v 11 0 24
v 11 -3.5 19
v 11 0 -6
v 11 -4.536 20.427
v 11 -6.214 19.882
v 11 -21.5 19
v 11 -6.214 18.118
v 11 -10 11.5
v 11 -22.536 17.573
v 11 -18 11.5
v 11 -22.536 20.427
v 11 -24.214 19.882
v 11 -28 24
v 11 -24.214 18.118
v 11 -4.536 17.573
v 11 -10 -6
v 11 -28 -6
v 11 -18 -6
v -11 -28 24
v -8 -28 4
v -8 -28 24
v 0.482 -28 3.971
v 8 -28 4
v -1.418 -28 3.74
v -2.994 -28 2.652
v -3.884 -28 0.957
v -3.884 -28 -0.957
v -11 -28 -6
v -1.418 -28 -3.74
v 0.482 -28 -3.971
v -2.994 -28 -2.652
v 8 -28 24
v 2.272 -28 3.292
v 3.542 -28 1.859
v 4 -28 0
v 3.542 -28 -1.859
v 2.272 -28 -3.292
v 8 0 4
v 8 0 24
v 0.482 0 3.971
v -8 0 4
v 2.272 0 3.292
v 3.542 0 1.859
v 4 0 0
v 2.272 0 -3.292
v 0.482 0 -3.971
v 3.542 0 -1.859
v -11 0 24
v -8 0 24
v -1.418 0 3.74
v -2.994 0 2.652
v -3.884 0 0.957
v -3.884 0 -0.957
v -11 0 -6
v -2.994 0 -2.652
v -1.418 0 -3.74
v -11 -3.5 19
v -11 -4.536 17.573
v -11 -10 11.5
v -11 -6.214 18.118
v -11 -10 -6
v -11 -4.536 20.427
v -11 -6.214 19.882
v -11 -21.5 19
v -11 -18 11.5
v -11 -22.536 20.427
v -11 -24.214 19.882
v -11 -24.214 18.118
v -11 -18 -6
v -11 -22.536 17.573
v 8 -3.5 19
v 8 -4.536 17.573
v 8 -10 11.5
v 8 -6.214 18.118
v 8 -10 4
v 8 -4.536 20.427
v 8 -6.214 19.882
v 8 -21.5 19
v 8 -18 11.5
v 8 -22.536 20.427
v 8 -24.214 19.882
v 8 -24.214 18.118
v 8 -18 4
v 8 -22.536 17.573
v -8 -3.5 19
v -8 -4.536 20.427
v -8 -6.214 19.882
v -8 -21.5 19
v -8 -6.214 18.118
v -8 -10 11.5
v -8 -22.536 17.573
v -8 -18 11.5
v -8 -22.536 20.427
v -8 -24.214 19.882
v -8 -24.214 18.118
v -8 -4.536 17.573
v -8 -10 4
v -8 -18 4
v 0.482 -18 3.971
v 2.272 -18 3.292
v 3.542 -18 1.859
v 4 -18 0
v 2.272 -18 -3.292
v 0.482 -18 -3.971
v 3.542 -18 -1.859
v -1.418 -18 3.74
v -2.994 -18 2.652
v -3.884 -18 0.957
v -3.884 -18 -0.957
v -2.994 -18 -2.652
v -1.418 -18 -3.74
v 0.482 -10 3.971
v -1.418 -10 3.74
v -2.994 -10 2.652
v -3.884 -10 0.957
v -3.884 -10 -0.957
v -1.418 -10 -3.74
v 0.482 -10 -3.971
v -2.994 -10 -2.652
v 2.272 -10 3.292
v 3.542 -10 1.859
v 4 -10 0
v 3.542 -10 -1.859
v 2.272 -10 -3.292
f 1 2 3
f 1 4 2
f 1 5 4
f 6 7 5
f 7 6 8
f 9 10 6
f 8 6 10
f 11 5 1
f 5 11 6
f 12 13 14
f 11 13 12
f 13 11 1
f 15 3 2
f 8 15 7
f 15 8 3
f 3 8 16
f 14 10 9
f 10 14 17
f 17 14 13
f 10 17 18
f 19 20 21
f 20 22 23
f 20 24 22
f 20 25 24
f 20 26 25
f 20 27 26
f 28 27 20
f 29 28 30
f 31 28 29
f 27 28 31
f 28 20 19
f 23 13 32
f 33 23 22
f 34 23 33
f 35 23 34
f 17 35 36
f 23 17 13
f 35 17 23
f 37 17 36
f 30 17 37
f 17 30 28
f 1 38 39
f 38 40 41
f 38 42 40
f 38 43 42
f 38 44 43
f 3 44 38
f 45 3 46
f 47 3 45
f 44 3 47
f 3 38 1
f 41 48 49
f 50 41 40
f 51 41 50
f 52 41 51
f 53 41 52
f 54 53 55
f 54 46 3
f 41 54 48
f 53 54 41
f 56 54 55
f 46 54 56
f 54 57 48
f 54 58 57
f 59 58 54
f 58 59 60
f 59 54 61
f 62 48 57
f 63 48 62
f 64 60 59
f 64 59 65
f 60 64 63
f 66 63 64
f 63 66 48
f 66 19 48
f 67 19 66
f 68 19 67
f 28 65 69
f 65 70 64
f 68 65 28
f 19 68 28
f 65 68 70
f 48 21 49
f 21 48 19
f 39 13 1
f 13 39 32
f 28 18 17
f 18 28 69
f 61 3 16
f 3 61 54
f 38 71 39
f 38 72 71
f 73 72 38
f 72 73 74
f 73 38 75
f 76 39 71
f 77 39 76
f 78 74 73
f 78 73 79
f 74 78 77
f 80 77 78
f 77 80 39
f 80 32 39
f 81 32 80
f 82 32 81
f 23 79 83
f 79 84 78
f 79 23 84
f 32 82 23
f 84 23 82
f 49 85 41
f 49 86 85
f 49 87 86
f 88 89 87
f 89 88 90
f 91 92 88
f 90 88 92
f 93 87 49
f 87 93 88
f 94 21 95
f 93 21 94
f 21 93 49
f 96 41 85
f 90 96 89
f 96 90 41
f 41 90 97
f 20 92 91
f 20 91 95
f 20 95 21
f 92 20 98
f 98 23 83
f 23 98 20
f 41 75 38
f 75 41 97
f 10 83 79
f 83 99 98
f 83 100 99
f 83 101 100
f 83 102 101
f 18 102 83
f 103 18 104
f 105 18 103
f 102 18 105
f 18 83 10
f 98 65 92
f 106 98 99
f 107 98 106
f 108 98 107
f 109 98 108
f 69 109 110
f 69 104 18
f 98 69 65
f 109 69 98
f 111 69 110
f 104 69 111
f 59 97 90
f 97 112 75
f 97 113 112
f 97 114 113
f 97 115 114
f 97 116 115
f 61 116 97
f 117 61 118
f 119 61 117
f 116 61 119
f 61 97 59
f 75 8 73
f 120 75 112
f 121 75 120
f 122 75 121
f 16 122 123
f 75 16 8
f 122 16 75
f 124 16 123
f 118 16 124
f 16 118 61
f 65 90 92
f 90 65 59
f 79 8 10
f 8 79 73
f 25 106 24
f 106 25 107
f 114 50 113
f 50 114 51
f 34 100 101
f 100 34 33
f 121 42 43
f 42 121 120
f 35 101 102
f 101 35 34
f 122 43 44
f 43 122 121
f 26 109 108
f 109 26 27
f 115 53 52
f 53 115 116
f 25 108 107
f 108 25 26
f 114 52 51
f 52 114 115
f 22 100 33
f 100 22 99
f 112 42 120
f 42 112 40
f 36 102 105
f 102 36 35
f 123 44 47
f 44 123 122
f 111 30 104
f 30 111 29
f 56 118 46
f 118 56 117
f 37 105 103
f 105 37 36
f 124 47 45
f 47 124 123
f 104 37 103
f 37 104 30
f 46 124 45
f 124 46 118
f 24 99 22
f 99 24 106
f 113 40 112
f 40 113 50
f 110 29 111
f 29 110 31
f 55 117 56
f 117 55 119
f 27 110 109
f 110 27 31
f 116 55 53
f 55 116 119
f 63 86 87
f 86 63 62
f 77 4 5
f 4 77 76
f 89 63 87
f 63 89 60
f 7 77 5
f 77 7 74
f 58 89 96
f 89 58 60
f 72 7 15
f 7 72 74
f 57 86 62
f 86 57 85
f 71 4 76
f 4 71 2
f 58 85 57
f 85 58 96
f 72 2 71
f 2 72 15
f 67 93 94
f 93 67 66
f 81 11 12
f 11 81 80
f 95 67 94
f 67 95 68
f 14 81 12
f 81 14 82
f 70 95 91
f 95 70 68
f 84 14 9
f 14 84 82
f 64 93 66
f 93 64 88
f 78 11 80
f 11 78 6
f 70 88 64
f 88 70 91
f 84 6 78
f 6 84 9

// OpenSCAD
// thickness of wood plate, mm
thick = 16;

// vertical length of plate side to cover, mm
sides = 20;

// inner diameter of bearing axle, mm
b_inner = 8;

// outer diameter of bearing, mm
b_outer = 22;

// height/thickness of bearing, mm
b_height = 7;


rotate( [ 90, 0, 0 ] ) {

translate( [0,0,10.5]) {
//	cylinder( d=b_outer, b_height ); // bearing
}

difference() {
union() {
translate( [ - 3 - 0.5 * thick , b_inner / 2, 0 ] )  {
	cube( [ thick + 3+3, sides, 21 + b_height ] ); // main body
	translate( [ 0, -2 -1 * b_inner, 0 ] )
		cube( [ thick + 3+ 3, sides, 21 + b_height ] ); // front round
	}
	}
translate( [ - 0.5 * thick, 0.5 * b_inner, -0.5 ] )
	cube( [ thick, sides + 1, b_height + 22 ] ); //  wood plate
translate( [ -0.5 * (thick + 6 + 1), -0.5 * (b_outer + 1), 10 ] )
	cube( [ thick + 6 + 1, b_outer + 1, b_height + 1 ] ); // opening for bearing
translate( [0,0, -0.5] )
	cylinder( 22 + b_height, d=b_inner ); // axle

translate( [- 0.5 * (thick + 6.1 ),sides - 1, 5 ] ) 
	rotate( [ 0, 90, 0 ] )
	cylinder( d = 3, thick + 6.1 ); // screw hole

translate( [- 0.5 * (thick + 6.1 ),sides - 1, 21 + b_height - 5  ] ) 
	rotate( [ 0, 90, 0 ] )
	cylinder( d = 3, thick + 6.1 ); // screw hole


}

}
